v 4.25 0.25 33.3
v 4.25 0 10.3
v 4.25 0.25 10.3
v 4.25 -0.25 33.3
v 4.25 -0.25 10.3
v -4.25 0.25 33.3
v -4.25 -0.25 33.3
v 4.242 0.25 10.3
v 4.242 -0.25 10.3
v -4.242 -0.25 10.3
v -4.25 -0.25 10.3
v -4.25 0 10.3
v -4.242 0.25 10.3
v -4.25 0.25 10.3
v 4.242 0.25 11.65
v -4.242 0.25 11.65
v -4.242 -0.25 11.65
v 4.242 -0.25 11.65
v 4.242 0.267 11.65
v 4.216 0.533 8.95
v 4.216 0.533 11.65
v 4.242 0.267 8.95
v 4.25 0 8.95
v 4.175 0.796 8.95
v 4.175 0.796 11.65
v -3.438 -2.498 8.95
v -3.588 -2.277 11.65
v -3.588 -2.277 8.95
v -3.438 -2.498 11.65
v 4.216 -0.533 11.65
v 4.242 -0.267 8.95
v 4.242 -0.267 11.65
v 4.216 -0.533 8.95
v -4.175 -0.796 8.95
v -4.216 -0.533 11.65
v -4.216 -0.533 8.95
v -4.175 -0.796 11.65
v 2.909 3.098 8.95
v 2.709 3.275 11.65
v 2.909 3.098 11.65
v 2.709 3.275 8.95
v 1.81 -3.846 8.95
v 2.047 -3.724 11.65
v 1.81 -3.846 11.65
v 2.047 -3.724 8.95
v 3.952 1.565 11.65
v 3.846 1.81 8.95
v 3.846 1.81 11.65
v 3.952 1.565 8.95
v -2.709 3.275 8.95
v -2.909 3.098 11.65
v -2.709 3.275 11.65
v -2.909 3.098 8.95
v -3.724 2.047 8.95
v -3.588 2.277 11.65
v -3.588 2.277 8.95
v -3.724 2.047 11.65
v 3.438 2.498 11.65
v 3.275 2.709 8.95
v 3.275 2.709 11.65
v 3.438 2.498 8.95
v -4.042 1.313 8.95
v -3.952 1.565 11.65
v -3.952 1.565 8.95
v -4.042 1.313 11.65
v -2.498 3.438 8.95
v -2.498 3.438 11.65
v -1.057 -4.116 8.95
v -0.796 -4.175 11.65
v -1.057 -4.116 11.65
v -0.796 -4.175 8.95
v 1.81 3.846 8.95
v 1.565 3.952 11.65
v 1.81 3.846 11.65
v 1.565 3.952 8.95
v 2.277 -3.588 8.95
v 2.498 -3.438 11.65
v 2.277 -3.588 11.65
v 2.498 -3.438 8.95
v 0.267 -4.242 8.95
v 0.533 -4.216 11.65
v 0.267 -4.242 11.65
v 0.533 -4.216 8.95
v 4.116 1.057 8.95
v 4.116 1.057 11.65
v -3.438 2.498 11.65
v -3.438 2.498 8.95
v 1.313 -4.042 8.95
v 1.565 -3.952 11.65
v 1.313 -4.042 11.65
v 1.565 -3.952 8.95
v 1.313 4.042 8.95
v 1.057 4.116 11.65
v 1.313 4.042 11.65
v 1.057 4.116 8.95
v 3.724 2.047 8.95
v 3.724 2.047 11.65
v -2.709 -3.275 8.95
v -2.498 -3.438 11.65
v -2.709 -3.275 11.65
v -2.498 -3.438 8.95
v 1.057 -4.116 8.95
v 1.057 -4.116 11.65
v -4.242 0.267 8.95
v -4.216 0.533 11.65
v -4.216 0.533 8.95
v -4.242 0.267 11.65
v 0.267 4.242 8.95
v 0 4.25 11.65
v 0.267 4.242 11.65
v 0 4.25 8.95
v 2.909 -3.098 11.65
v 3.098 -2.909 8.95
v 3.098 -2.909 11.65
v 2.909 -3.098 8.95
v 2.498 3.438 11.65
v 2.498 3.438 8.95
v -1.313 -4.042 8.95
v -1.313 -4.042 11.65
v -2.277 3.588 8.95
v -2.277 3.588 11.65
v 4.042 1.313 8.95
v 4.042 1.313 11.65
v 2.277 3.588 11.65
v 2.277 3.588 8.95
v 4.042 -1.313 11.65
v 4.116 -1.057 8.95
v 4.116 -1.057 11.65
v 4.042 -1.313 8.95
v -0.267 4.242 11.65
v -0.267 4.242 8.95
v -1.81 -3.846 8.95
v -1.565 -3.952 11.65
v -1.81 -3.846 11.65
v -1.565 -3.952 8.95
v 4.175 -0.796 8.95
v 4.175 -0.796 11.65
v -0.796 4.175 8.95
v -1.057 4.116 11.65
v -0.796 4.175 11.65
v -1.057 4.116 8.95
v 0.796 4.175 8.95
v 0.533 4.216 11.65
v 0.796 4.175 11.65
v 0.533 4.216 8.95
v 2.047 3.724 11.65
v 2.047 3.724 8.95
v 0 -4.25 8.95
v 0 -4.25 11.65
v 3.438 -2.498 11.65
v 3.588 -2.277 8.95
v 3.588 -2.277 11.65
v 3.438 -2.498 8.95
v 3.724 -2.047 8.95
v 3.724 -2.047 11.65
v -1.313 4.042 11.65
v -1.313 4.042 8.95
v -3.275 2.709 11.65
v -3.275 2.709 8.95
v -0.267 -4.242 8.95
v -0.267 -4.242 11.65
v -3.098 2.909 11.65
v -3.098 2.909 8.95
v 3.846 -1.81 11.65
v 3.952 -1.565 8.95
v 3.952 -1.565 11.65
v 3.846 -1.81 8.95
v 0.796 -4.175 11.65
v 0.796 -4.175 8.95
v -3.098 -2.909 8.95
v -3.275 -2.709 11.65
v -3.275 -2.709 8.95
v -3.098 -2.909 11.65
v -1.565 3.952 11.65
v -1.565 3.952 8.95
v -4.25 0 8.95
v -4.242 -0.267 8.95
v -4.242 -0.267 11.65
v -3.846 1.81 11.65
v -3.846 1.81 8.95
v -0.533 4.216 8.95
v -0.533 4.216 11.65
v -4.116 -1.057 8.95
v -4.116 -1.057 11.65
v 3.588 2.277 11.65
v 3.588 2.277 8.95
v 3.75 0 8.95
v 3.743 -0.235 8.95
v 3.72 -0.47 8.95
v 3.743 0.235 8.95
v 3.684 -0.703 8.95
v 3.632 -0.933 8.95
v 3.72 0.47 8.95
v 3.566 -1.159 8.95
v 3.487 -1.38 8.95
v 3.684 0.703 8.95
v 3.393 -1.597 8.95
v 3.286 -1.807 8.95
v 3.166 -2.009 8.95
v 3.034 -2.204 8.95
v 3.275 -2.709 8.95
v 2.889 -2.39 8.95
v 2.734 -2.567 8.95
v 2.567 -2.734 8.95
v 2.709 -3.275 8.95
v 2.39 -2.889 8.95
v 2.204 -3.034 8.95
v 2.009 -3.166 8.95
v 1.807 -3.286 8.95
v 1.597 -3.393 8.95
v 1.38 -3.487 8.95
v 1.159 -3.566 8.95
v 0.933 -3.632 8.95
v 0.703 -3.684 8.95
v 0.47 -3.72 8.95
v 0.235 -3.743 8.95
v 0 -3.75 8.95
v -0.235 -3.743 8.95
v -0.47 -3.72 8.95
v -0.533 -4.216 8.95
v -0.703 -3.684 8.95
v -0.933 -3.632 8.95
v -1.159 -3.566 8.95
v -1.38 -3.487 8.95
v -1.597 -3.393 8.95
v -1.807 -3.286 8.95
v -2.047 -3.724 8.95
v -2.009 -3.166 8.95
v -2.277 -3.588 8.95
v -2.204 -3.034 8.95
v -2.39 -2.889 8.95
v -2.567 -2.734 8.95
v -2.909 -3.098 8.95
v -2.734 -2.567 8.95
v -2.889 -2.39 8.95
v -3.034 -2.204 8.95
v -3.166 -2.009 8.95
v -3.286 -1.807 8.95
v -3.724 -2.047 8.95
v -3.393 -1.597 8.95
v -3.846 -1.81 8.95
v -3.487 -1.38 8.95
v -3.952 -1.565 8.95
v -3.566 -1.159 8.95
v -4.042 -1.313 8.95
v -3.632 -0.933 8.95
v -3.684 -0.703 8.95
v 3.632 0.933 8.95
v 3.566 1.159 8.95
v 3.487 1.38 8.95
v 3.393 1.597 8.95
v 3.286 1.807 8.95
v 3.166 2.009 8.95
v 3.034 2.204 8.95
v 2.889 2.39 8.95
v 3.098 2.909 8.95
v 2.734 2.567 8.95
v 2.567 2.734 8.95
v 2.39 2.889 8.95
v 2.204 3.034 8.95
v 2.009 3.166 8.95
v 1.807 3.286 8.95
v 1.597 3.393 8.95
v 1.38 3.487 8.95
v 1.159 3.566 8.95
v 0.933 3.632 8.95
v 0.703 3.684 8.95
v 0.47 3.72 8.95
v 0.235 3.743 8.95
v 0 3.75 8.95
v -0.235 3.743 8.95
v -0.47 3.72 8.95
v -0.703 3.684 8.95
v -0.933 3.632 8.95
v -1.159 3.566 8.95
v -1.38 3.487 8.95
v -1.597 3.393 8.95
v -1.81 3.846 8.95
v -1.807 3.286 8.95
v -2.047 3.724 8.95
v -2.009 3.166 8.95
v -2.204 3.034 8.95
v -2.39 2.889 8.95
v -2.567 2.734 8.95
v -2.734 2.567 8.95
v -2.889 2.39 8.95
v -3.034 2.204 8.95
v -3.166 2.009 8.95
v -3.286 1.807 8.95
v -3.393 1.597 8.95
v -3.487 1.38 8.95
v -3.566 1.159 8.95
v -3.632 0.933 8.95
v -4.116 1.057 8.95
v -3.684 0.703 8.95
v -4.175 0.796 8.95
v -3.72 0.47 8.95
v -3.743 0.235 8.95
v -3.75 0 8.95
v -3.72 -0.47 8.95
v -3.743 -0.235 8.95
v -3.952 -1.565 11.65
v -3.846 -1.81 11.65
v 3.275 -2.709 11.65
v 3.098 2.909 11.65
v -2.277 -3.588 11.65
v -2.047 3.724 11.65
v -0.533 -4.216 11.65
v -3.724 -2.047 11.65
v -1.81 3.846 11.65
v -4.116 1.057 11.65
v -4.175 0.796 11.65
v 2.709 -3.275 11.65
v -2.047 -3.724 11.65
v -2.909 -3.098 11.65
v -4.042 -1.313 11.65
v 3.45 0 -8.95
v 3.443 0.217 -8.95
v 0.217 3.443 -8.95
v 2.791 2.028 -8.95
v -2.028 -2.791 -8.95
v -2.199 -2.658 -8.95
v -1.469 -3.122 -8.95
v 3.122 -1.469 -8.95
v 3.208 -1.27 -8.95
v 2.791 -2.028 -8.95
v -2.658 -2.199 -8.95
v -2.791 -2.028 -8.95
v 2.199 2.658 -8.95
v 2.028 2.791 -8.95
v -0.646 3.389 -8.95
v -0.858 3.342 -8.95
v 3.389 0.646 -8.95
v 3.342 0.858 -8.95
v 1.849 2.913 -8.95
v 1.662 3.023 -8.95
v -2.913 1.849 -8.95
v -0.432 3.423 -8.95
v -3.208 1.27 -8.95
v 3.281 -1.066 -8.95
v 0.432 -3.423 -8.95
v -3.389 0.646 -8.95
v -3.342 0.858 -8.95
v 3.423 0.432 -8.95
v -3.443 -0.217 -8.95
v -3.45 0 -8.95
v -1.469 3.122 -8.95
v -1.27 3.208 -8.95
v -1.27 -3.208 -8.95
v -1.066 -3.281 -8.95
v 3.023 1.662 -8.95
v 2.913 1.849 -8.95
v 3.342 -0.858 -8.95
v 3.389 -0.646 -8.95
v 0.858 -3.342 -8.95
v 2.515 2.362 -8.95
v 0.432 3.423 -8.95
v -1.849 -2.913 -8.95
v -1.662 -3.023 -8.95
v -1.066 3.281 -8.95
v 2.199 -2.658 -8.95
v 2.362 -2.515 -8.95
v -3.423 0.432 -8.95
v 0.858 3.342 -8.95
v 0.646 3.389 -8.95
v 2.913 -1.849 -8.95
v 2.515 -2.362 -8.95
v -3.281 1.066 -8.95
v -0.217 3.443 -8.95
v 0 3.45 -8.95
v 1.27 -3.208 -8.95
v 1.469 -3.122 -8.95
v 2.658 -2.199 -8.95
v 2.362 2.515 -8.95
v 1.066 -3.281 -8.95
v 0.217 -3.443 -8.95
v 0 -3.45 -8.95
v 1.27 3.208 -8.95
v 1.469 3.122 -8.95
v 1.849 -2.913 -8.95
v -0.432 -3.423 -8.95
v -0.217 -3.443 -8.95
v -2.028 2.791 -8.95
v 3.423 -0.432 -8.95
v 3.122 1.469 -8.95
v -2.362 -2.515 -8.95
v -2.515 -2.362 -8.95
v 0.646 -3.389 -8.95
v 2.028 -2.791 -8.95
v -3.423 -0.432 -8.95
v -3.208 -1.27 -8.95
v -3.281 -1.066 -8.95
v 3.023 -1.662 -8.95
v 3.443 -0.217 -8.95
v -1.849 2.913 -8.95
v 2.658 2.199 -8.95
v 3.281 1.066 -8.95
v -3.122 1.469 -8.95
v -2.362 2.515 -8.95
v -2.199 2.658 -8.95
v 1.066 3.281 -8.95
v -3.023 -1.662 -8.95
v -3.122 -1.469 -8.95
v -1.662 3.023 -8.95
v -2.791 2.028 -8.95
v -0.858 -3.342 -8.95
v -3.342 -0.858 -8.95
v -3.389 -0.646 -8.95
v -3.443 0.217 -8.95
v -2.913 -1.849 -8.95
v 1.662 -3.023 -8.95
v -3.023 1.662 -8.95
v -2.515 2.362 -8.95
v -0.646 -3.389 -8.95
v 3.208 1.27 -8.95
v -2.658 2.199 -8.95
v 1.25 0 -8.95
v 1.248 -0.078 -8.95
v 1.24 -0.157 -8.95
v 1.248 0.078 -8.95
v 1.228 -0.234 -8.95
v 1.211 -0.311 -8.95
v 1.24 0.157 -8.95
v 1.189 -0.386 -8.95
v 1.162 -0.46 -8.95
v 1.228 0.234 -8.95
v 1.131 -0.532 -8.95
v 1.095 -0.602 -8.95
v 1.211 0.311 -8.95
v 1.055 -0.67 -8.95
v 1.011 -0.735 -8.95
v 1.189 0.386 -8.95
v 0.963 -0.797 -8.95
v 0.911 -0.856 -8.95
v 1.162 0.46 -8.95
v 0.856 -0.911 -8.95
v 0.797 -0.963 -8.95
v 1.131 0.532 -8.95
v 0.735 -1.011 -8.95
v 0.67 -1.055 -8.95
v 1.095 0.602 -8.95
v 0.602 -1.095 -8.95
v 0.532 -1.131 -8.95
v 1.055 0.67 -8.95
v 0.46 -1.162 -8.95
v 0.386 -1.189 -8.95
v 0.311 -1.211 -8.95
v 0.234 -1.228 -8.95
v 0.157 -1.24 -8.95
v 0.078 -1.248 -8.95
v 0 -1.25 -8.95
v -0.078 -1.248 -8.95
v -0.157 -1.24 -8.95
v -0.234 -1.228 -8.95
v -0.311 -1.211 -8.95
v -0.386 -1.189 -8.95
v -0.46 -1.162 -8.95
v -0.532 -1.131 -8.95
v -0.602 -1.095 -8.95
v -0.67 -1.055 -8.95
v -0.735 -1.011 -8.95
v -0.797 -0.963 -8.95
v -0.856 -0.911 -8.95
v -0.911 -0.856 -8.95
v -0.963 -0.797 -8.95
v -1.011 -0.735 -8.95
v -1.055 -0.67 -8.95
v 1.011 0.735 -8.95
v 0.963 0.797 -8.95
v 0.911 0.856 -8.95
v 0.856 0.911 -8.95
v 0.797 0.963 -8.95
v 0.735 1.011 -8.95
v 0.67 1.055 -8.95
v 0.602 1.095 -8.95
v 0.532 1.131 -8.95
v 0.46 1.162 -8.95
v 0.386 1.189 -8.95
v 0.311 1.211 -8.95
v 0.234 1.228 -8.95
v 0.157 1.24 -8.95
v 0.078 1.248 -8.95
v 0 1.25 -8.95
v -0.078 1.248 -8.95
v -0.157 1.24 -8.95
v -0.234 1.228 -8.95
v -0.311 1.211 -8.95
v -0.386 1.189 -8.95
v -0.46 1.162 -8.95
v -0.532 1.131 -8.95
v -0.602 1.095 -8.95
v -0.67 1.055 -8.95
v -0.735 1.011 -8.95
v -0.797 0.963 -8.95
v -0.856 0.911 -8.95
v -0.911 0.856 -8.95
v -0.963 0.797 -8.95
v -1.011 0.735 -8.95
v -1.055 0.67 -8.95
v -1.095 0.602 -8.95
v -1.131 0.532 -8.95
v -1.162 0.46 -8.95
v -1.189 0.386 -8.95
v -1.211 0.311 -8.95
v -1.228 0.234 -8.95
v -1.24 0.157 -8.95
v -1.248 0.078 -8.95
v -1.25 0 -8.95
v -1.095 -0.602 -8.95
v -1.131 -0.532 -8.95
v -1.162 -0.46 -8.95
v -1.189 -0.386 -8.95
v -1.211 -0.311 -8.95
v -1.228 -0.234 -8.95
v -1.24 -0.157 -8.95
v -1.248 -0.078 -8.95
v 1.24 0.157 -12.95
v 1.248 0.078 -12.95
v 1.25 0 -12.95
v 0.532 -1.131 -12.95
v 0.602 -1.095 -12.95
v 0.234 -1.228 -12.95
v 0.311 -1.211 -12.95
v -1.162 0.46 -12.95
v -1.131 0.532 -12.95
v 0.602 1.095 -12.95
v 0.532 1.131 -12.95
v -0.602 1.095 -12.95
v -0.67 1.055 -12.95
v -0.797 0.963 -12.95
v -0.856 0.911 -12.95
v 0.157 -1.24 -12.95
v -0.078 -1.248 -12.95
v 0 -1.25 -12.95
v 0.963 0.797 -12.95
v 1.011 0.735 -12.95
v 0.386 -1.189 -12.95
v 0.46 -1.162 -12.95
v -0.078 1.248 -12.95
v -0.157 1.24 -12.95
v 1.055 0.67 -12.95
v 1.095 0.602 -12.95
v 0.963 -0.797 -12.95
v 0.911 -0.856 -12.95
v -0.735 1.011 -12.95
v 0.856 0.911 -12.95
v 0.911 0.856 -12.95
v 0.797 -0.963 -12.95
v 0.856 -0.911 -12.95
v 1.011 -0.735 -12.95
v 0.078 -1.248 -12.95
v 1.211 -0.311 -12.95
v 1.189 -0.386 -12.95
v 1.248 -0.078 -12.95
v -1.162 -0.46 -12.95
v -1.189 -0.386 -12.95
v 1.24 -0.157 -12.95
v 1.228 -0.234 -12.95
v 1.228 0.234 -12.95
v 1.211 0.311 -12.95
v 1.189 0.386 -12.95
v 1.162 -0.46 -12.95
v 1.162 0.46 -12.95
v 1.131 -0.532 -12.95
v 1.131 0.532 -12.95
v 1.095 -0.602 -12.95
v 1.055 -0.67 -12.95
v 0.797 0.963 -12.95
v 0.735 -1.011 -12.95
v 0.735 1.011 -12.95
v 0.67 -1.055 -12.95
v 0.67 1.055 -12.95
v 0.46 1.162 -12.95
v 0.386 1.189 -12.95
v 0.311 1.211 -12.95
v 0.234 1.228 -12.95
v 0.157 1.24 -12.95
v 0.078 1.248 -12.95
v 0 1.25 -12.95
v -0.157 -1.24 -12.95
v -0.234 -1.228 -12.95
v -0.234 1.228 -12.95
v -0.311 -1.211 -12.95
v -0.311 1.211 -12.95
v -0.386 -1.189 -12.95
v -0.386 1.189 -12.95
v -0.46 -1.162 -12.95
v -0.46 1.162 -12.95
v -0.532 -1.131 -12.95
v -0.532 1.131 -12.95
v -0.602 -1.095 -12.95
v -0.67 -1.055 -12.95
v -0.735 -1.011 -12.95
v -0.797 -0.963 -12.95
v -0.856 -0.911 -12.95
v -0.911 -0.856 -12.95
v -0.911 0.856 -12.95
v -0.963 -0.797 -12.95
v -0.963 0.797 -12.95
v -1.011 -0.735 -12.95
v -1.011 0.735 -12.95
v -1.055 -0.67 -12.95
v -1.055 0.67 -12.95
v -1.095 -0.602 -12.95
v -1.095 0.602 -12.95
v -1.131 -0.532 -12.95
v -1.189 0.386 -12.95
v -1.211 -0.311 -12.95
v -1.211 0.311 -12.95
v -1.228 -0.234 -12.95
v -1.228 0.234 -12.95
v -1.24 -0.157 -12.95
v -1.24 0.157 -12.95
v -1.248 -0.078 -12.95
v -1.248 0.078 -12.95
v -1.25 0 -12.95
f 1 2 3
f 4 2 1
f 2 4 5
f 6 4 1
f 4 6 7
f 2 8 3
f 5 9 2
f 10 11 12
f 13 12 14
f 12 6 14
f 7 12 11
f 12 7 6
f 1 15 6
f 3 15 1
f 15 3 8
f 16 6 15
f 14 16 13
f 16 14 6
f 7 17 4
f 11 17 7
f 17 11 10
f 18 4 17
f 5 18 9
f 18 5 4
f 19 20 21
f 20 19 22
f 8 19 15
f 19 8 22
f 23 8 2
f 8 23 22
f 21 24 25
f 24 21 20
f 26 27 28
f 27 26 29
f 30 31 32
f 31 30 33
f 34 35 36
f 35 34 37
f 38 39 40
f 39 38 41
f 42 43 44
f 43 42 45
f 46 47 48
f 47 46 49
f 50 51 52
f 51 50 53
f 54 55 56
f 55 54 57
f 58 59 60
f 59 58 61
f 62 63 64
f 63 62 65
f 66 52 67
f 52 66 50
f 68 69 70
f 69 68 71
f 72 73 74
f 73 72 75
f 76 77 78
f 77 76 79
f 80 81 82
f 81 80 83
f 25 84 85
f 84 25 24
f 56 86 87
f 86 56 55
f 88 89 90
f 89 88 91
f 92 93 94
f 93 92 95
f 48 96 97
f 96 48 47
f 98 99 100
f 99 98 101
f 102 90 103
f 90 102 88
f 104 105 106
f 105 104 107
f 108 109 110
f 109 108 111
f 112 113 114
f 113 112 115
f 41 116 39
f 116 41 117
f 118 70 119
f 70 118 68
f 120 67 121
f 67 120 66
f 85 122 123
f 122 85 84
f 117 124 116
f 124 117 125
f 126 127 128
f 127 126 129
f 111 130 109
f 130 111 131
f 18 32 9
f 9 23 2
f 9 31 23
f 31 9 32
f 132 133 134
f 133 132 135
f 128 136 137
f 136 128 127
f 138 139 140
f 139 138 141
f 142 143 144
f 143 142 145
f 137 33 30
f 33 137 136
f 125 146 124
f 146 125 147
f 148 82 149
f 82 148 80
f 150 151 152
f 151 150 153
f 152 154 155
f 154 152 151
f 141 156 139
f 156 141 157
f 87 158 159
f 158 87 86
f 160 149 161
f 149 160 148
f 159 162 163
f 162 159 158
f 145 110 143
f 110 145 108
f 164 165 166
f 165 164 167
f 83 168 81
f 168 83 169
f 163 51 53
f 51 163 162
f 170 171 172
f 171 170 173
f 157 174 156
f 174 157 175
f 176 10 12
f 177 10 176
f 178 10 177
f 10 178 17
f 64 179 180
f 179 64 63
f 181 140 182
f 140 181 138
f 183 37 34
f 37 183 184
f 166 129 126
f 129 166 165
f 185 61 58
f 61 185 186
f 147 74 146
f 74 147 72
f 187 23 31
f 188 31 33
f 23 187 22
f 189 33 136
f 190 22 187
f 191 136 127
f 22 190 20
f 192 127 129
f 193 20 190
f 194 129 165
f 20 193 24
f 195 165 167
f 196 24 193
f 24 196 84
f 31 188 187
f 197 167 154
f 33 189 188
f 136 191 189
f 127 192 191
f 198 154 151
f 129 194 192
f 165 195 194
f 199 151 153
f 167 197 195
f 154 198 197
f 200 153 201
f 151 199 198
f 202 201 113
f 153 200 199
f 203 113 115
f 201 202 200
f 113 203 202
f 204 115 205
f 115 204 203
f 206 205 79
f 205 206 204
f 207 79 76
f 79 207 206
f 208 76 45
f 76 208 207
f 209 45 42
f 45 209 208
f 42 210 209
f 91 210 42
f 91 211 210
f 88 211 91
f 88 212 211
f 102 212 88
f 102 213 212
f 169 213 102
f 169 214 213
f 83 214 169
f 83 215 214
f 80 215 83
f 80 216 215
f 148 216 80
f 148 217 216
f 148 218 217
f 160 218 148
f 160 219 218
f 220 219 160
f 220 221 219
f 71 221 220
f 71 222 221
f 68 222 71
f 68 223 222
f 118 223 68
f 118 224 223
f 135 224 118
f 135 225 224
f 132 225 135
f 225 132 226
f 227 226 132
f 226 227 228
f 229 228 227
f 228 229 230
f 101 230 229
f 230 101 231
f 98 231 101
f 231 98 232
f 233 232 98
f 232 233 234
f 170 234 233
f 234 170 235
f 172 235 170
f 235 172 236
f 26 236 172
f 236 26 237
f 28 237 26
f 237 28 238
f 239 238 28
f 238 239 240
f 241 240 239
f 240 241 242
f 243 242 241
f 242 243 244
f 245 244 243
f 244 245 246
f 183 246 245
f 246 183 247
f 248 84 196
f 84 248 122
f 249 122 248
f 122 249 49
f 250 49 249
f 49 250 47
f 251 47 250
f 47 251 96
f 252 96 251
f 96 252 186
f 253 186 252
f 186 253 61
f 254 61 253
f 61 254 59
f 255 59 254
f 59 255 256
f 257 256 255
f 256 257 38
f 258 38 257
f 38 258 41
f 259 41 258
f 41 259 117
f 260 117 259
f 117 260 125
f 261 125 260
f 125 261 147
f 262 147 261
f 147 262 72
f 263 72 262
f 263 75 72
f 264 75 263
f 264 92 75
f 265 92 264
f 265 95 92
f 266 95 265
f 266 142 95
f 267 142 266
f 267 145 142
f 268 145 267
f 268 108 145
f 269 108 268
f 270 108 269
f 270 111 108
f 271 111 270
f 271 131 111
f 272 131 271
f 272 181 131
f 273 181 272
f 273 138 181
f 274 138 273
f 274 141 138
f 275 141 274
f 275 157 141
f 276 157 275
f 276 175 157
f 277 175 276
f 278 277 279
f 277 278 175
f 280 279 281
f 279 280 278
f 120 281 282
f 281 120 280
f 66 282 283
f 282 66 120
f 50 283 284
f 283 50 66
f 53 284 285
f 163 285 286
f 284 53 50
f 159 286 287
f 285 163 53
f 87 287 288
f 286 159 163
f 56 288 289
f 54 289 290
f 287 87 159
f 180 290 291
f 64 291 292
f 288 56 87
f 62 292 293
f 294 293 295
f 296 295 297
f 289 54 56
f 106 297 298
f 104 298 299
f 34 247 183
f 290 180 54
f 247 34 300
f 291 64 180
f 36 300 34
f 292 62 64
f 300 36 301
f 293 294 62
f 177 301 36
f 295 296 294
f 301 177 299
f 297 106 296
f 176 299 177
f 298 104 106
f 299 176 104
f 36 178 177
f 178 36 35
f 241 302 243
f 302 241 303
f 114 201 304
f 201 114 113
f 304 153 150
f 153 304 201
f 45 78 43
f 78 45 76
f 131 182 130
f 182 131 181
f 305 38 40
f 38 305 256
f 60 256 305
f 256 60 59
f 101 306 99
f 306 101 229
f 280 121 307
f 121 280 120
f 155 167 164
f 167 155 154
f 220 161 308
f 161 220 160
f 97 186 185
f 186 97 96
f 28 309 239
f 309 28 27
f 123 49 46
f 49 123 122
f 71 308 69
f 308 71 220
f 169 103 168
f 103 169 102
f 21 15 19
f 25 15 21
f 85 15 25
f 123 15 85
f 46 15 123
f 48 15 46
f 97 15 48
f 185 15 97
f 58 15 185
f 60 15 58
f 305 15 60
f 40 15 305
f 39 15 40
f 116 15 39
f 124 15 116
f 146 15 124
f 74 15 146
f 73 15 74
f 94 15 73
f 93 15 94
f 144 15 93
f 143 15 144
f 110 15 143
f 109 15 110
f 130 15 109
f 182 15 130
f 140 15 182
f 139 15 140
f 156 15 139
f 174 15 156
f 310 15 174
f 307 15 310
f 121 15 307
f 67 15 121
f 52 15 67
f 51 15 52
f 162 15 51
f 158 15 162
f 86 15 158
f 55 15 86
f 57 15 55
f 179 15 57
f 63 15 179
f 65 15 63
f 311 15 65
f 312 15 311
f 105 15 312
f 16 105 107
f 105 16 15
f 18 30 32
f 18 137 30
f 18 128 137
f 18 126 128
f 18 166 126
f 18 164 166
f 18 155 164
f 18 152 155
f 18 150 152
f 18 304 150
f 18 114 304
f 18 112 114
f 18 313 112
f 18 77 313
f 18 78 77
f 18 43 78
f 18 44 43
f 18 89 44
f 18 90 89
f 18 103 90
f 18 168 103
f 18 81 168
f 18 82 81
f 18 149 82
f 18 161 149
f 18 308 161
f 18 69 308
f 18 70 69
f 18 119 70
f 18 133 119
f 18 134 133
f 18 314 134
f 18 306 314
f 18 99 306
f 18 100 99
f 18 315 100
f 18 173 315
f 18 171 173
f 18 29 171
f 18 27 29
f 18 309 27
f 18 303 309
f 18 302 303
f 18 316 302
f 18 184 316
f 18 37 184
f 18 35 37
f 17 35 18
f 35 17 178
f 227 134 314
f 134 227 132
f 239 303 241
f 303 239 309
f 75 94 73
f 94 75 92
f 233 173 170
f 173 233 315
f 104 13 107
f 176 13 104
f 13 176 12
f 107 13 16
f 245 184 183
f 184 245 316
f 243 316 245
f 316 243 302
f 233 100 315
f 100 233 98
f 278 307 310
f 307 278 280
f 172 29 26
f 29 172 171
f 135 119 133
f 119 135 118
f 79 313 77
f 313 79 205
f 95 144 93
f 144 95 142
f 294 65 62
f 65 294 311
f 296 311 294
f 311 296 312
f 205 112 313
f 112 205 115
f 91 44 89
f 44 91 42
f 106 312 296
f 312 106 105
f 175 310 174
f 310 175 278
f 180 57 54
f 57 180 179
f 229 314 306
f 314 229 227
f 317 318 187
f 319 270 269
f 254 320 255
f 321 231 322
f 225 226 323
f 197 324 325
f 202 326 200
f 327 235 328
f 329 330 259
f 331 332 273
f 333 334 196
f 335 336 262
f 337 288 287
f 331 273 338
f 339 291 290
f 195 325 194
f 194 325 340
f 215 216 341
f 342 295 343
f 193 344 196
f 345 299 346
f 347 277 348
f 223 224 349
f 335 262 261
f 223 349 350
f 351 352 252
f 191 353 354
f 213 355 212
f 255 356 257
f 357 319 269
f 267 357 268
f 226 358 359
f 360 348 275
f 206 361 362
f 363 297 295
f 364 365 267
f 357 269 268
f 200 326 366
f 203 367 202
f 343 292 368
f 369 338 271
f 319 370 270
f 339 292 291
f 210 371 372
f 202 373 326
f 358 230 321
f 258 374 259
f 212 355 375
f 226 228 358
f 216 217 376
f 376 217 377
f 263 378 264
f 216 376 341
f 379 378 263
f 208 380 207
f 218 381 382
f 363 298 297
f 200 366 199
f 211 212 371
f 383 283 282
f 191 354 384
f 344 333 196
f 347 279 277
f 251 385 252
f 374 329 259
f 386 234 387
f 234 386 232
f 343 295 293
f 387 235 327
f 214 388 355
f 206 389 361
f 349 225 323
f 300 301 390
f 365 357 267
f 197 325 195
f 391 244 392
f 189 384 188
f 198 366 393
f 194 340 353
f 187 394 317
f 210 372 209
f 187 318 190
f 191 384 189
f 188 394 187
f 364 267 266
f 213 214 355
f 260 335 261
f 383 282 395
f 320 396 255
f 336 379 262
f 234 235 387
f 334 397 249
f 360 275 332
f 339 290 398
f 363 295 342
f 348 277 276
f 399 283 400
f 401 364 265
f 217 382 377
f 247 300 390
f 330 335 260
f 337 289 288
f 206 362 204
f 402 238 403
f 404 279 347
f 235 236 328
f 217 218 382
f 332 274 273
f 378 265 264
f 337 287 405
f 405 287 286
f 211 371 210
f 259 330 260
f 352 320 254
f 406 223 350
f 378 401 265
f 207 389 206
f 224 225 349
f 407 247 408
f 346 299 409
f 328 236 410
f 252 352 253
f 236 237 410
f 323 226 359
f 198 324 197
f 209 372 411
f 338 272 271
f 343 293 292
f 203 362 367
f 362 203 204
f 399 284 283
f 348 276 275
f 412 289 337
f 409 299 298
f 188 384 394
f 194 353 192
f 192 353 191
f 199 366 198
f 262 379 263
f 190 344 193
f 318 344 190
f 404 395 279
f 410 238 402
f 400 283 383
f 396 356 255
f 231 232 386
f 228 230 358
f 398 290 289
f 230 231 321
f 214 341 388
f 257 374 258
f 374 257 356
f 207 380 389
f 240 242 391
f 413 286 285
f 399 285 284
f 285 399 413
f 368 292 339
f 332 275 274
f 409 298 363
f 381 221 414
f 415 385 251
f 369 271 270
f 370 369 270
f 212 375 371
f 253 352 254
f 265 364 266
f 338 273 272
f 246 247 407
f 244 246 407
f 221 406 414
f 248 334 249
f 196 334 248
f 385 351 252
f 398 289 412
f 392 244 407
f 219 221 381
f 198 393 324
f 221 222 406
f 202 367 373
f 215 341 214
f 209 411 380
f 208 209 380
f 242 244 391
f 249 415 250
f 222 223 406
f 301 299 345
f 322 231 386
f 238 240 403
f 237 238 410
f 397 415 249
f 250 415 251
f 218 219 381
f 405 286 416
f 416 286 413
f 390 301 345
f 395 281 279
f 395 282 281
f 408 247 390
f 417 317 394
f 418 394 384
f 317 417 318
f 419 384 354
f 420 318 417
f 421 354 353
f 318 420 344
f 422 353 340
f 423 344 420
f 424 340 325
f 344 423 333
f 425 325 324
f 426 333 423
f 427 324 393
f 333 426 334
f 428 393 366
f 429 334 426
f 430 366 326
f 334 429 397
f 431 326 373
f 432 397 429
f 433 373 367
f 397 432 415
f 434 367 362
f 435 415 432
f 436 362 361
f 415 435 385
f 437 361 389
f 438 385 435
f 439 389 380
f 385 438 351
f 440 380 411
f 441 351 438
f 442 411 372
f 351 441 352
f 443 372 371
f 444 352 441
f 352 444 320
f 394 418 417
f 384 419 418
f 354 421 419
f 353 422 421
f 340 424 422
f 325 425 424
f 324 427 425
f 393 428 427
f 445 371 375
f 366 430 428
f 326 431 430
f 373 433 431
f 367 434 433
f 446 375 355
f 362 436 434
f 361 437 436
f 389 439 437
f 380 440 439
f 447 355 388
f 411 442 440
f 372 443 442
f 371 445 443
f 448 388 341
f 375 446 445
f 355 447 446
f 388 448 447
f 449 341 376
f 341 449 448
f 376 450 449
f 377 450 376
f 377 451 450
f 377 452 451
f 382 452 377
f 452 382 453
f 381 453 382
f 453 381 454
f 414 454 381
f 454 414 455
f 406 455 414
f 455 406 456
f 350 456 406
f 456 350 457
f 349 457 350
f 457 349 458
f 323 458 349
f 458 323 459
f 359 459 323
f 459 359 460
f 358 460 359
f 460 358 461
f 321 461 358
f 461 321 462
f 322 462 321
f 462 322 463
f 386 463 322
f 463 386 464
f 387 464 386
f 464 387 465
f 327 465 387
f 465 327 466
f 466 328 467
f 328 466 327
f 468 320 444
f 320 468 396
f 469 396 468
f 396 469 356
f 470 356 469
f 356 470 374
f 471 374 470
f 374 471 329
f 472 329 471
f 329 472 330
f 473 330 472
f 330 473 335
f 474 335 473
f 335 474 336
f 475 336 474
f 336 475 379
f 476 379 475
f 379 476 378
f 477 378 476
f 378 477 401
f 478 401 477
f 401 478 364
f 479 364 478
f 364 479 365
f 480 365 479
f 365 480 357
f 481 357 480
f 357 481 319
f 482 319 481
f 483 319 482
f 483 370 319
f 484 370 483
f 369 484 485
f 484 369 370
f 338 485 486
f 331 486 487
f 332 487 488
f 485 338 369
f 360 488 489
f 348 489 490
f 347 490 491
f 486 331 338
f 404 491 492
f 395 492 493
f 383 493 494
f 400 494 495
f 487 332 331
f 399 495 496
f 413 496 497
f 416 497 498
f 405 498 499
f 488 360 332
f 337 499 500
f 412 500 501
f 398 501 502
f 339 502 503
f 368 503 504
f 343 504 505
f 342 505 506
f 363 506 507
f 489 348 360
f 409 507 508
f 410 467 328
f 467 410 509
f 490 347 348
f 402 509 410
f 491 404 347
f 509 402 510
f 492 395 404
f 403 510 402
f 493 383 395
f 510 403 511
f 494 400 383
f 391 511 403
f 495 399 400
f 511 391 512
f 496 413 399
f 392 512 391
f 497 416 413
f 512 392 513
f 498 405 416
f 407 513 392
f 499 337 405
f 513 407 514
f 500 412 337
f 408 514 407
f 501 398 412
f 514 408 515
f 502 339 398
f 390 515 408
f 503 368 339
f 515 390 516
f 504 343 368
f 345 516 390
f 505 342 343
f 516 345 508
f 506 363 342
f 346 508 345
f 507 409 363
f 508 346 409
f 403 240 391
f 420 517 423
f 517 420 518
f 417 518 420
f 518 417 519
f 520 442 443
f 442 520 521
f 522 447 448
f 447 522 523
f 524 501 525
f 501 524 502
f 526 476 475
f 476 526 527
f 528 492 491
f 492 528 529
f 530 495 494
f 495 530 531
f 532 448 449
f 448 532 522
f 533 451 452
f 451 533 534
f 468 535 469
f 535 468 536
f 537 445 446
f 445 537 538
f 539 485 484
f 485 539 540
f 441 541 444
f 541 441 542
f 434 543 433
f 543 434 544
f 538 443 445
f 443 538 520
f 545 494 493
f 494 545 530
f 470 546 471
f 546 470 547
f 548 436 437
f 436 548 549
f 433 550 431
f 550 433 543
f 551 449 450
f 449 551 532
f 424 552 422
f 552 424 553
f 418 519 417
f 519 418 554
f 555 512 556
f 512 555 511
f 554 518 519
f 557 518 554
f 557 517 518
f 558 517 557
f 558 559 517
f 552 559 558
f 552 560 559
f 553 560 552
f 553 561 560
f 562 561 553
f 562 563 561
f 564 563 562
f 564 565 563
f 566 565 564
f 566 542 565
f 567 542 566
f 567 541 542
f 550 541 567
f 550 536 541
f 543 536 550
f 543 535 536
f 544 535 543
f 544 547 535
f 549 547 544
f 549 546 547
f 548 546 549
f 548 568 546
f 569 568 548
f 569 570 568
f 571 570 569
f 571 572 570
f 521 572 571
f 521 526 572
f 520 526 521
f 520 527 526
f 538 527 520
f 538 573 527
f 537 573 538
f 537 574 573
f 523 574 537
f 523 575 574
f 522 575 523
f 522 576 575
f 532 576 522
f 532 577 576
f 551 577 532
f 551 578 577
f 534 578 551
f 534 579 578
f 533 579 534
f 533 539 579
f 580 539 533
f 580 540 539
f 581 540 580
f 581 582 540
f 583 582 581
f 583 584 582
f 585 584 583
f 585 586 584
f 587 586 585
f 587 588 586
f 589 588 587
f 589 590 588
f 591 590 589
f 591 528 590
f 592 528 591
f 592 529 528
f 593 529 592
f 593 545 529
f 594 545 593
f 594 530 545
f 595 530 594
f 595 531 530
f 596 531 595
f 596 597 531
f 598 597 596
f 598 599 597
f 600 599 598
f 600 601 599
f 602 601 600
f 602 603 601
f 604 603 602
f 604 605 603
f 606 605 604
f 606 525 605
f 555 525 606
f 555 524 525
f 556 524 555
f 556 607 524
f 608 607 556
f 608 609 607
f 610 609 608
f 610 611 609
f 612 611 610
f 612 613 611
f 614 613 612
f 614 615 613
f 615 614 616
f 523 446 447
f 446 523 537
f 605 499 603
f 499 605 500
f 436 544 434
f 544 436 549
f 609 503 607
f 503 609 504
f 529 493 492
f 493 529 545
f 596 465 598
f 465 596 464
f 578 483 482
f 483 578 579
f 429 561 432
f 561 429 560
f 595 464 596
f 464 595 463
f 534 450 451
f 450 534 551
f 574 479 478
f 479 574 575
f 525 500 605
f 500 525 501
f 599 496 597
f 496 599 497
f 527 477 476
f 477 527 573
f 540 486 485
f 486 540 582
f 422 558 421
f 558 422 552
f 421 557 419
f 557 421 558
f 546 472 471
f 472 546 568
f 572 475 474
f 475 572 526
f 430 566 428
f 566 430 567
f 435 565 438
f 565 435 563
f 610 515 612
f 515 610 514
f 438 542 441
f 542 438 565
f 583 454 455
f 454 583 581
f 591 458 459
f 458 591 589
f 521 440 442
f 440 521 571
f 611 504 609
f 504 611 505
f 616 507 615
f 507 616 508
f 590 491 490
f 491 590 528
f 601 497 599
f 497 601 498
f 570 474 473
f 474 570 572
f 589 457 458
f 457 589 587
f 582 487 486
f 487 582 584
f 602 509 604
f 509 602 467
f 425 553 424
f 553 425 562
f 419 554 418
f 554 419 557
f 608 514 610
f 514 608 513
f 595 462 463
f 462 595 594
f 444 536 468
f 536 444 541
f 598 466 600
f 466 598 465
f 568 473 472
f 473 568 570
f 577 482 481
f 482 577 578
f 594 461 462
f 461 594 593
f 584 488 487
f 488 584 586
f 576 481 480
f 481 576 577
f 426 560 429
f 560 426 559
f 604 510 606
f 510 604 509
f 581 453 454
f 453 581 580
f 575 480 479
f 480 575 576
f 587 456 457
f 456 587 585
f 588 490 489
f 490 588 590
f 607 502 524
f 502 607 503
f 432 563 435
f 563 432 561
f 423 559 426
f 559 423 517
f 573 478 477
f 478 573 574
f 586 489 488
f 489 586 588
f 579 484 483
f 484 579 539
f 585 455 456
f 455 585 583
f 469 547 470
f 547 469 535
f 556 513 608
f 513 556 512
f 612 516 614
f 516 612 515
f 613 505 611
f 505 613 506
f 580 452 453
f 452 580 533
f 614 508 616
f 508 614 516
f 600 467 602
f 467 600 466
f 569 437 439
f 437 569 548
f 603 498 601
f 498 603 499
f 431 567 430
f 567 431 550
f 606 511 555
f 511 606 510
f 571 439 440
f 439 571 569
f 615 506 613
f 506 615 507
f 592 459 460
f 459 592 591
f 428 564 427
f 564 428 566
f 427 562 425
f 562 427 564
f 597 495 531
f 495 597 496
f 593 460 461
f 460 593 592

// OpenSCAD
translate([0,0,21.8]) cube([8.5,0.5,23], true);
translate([0,0,10.3]) cylinder(h = 2.7, d = 8.5, center = true, $fn=100);
cylinder(h = 17.9, d1 = 6.9, d2 = 7.5, center = true, $fn=100);
translate([0,0,-10.95]) cylinder(h = 4, d = 2.5, center = true, $fn=100);
